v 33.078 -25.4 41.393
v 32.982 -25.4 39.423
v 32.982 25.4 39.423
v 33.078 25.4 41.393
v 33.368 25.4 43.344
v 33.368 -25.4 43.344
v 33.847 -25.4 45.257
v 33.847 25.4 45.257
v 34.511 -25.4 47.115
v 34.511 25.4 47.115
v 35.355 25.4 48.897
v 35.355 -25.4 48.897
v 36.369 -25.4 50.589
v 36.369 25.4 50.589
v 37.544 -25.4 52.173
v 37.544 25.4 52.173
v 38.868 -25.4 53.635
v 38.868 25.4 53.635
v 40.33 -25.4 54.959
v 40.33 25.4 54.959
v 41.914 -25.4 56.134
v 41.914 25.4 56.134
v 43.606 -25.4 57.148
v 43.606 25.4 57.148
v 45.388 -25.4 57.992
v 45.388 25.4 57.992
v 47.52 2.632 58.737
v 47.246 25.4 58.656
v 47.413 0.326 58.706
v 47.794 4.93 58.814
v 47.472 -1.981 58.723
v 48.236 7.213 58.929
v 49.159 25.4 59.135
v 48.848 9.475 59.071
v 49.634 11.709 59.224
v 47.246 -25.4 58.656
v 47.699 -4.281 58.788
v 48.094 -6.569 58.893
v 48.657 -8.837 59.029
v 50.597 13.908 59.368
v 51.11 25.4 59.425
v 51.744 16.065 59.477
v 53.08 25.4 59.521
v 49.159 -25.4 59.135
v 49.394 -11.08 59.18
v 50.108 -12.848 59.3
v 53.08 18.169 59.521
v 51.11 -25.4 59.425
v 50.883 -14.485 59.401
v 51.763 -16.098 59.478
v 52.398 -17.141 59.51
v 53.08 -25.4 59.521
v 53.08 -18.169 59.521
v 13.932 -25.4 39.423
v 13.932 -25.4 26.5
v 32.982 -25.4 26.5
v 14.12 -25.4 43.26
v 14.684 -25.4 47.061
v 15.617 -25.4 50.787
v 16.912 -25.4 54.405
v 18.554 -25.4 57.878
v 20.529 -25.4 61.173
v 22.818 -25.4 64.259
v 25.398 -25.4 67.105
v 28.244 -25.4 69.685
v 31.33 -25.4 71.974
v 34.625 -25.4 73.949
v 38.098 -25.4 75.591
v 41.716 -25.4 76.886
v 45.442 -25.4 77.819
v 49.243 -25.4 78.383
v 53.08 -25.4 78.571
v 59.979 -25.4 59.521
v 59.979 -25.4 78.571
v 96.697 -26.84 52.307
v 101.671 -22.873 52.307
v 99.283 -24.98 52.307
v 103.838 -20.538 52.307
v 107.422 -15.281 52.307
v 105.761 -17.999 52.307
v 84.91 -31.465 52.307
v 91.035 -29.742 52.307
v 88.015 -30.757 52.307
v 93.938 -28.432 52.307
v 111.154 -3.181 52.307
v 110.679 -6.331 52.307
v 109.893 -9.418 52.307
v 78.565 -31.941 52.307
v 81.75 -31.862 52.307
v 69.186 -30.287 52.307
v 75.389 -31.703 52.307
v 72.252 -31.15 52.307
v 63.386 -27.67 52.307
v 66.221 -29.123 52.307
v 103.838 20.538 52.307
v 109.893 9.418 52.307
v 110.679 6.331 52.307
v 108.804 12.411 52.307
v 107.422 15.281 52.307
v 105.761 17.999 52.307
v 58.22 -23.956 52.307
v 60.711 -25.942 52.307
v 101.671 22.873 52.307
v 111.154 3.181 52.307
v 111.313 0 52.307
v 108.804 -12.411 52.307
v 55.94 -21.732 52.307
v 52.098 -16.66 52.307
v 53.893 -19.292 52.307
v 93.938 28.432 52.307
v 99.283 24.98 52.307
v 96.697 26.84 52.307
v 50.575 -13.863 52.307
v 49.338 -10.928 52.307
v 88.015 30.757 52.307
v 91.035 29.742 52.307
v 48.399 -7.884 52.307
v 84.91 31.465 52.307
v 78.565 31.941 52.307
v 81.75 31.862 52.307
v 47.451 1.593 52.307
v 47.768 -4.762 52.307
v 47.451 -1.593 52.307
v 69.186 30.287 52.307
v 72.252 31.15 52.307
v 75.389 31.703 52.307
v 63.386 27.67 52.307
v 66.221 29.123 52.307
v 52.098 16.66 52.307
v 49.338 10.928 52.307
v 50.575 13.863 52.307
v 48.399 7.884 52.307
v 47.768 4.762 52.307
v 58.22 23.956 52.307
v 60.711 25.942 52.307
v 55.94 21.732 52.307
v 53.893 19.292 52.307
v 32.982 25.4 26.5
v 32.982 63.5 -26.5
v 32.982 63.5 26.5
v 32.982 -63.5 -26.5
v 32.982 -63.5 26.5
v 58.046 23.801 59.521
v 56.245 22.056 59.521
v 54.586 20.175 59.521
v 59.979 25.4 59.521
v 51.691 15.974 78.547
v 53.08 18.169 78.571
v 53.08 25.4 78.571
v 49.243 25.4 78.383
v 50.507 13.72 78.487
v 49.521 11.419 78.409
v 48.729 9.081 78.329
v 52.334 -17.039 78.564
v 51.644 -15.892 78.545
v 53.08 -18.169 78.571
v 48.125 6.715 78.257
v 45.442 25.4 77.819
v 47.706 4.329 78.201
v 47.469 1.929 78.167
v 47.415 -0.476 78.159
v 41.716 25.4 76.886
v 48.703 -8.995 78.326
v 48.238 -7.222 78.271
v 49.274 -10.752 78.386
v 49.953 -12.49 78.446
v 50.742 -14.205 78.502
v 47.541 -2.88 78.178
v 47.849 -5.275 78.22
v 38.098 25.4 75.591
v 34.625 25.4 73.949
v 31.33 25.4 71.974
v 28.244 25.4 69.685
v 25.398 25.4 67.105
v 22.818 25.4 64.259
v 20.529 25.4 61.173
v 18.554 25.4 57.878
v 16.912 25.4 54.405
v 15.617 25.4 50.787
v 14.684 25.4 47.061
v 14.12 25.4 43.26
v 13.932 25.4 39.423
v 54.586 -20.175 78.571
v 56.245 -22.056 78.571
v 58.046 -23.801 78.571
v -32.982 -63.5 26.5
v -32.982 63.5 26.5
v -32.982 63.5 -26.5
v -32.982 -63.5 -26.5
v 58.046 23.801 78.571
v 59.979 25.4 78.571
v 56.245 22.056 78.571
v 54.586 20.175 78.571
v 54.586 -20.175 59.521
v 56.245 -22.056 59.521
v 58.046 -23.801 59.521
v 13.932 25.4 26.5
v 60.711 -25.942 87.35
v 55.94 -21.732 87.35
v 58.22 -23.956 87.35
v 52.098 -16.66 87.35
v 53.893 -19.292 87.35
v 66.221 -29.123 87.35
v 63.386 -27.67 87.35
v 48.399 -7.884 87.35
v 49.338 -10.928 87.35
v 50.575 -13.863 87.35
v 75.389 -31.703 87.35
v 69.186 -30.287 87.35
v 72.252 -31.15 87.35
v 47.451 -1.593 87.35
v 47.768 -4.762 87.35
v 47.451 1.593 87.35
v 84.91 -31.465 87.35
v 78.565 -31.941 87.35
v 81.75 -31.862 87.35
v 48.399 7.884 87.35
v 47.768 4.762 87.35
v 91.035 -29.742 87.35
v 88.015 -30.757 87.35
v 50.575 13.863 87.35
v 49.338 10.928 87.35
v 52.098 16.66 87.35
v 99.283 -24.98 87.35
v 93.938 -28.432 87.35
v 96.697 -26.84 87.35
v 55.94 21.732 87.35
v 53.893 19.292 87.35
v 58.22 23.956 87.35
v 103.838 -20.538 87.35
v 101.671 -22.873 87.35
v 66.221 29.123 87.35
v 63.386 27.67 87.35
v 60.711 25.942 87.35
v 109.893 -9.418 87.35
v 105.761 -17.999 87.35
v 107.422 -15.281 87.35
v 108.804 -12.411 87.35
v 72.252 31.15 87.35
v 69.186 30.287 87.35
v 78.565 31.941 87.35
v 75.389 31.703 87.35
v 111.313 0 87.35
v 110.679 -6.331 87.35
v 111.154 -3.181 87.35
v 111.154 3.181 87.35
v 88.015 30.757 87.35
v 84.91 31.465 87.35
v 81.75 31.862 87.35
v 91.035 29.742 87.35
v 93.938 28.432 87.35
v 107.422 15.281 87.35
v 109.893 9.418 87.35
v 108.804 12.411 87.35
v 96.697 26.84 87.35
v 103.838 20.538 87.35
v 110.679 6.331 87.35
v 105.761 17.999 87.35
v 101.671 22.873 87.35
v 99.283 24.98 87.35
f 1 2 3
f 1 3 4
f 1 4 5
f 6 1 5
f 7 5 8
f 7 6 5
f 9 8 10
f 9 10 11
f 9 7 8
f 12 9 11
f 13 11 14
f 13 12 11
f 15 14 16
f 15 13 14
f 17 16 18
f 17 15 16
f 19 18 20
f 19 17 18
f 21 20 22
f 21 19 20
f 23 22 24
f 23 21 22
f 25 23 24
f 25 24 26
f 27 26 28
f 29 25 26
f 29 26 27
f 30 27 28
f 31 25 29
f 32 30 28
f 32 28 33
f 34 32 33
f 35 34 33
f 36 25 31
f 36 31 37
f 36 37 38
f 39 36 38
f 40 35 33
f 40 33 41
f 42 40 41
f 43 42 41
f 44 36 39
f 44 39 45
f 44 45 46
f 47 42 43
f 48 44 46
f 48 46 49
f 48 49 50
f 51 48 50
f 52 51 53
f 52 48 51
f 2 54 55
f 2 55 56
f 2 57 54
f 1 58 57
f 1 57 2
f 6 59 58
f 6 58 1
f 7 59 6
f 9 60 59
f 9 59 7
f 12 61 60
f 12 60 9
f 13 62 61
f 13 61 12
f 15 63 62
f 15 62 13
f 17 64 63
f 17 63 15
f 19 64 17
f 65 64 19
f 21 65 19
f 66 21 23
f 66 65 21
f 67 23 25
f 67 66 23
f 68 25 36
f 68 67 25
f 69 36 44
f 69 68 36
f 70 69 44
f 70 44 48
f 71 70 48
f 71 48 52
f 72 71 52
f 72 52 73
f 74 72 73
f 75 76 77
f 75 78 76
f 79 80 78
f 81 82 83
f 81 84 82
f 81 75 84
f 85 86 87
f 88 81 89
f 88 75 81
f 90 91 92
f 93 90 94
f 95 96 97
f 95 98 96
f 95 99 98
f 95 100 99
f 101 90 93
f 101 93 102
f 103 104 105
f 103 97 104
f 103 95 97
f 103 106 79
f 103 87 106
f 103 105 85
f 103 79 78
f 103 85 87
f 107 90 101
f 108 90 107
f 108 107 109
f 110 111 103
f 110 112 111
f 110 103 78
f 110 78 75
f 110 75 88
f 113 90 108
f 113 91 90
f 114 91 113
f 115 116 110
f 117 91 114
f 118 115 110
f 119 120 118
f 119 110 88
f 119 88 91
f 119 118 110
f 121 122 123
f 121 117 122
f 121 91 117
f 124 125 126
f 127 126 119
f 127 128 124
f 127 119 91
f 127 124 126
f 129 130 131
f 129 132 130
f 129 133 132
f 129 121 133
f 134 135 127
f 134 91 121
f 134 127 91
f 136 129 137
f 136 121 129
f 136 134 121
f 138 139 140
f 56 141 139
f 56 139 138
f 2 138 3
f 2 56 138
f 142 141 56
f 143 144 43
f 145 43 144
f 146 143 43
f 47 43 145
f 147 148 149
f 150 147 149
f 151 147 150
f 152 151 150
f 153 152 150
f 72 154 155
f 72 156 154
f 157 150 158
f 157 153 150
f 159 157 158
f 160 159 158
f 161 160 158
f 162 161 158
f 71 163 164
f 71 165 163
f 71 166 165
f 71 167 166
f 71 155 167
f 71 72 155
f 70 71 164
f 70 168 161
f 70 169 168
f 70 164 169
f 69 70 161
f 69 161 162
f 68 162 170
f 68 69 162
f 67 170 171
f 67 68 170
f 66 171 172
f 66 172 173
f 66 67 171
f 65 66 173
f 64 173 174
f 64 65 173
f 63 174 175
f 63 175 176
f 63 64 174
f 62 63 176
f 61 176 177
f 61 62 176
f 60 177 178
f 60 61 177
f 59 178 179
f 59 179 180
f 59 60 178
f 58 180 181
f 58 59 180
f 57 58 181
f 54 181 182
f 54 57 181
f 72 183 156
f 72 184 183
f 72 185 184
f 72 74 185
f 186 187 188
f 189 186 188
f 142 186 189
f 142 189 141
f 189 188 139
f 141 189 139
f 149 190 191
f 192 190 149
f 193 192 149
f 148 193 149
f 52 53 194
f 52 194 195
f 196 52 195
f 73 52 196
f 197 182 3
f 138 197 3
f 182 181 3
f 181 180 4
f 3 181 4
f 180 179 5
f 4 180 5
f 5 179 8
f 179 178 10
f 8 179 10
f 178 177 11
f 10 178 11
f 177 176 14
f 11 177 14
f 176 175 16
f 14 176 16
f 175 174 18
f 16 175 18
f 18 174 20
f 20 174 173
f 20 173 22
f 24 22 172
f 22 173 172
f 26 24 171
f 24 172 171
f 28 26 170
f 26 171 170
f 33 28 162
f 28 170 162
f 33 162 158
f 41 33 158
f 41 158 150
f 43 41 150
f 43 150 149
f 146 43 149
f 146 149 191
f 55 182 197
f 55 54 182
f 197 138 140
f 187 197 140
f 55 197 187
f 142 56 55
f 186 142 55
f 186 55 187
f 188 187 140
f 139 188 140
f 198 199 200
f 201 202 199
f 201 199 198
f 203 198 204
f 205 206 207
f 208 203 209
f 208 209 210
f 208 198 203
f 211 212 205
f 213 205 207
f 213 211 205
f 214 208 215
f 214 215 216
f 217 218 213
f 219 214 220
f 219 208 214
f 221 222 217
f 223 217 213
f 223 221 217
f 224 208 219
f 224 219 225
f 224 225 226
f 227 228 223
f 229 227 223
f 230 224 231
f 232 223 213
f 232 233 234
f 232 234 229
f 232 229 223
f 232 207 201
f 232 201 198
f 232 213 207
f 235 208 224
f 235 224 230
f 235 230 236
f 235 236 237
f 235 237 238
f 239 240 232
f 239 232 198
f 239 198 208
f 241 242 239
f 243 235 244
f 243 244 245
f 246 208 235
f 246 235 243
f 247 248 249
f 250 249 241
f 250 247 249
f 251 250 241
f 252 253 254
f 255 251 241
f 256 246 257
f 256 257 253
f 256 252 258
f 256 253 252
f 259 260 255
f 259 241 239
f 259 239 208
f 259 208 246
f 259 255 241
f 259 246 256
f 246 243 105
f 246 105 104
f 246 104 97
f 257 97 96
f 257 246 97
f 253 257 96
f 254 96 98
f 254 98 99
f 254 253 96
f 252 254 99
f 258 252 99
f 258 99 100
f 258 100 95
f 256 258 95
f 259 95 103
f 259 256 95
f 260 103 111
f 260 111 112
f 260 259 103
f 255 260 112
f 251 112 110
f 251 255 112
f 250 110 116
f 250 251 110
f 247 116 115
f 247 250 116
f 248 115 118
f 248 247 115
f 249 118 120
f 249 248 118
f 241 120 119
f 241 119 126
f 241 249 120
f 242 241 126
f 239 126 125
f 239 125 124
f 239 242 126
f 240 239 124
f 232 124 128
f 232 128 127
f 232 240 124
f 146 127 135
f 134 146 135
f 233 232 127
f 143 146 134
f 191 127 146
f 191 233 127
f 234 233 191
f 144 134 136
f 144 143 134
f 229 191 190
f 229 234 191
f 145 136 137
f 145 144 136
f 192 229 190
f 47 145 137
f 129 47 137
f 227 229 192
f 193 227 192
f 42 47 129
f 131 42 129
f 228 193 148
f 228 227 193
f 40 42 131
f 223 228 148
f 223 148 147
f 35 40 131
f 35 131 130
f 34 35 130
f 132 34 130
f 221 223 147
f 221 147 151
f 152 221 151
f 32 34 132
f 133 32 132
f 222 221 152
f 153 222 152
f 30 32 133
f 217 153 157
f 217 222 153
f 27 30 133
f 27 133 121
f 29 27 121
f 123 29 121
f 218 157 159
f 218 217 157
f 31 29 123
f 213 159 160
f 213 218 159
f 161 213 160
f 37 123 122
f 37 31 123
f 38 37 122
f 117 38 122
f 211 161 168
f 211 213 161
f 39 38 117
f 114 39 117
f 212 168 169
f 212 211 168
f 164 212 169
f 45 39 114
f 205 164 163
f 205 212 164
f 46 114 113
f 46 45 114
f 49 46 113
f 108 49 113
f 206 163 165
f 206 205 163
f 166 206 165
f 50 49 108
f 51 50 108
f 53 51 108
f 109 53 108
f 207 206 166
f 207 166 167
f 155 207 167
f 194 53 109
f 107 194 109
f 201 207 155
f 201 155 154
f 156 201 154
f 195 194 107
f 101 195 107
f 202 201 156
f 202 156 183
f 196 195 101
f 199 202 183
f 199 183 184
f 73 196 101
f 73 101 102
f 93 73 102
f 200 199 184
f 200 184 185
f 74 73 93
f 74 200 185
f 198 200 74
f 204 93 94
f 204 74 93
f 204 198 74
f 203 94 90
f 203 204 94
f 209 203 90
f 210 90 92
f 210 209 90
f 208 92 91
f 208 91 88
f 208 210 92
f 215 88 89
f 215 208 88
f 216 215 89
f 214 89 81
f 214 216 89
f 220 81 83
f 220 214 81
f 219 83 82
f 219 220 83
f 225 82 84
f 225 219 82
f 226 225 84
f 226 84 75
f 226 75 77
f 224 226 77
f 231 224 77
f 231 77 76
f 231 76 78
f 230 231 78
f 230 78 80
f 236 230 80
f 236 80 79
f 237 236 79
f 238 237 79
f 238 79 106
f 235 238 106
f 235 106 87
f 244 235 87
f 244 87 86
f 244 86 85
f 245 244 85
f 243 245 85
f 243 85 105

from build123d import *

# Parameters (mm, degrees)
F1_DEPTH = 63.5
F0_W     = 11.337429
F0_H     = 8.77819
F2_DEPTH = 25.4


with BuildPart() as f1:
    # F0 (on Front) → F1 (new body, symmetric)
    with BuildSketch(Plane.XZ):
        Polygon((32.981567, -26.49961), (32.981567, 26.49961), (13.931567, 26.49961), (-32.981567, 26.49961), (-32.981567, -26.49961), align=None)
    extrude(amount=F1_DEPTH, both=True)

    # F0 (on Front) → F2 (join, symmetric)
    with BuildSketch(Plane.XZ):
        with BuildLine():
            Line((13.931567, 26.49961), (32.981567, 26.49961))
            Line((32.981567, 26.49961), (32.981567, 39.423279))
            ThreePointArc((32.981567, 39.423279), (38.868178, 53.634815), (53.079713, 59.521426))
            Line((53.079713, 59.521426), (68.024464, 59.521426))
            Line((68.024464, 59.521426), (68.024464, 78.571426))
            Line((68.024464, 78.571426), (53.079713, 78.571426))
            ThreePointArc((53.079713, 78.571426), (25.397794, 67.105199), (13.931567, 39.423279))
            Line((13.931567, 39.423279), (13.931567, 26.49961))
        make_face()
        with Locations((73.693178, 82.960521)):
            Rectangle(F0_W, F0_H)
    extrude(amount=F2_DEPTH, both=True)

    # F0 (on Front) → F3 (revolve)
    with BuildSketch(Plane.XZ):
        Polygon((79.361893, 78.571426), (79.361893, 59.521426), (79.361893, 52.306704), (111.312799, 52.306704), (111.312799, 87.349616), (79.361893, 87.349616), align=None)
    revolve(axis=Axis((79.361893, 0, 73.435521), (0, 0, 1)))


solid = f1.part
